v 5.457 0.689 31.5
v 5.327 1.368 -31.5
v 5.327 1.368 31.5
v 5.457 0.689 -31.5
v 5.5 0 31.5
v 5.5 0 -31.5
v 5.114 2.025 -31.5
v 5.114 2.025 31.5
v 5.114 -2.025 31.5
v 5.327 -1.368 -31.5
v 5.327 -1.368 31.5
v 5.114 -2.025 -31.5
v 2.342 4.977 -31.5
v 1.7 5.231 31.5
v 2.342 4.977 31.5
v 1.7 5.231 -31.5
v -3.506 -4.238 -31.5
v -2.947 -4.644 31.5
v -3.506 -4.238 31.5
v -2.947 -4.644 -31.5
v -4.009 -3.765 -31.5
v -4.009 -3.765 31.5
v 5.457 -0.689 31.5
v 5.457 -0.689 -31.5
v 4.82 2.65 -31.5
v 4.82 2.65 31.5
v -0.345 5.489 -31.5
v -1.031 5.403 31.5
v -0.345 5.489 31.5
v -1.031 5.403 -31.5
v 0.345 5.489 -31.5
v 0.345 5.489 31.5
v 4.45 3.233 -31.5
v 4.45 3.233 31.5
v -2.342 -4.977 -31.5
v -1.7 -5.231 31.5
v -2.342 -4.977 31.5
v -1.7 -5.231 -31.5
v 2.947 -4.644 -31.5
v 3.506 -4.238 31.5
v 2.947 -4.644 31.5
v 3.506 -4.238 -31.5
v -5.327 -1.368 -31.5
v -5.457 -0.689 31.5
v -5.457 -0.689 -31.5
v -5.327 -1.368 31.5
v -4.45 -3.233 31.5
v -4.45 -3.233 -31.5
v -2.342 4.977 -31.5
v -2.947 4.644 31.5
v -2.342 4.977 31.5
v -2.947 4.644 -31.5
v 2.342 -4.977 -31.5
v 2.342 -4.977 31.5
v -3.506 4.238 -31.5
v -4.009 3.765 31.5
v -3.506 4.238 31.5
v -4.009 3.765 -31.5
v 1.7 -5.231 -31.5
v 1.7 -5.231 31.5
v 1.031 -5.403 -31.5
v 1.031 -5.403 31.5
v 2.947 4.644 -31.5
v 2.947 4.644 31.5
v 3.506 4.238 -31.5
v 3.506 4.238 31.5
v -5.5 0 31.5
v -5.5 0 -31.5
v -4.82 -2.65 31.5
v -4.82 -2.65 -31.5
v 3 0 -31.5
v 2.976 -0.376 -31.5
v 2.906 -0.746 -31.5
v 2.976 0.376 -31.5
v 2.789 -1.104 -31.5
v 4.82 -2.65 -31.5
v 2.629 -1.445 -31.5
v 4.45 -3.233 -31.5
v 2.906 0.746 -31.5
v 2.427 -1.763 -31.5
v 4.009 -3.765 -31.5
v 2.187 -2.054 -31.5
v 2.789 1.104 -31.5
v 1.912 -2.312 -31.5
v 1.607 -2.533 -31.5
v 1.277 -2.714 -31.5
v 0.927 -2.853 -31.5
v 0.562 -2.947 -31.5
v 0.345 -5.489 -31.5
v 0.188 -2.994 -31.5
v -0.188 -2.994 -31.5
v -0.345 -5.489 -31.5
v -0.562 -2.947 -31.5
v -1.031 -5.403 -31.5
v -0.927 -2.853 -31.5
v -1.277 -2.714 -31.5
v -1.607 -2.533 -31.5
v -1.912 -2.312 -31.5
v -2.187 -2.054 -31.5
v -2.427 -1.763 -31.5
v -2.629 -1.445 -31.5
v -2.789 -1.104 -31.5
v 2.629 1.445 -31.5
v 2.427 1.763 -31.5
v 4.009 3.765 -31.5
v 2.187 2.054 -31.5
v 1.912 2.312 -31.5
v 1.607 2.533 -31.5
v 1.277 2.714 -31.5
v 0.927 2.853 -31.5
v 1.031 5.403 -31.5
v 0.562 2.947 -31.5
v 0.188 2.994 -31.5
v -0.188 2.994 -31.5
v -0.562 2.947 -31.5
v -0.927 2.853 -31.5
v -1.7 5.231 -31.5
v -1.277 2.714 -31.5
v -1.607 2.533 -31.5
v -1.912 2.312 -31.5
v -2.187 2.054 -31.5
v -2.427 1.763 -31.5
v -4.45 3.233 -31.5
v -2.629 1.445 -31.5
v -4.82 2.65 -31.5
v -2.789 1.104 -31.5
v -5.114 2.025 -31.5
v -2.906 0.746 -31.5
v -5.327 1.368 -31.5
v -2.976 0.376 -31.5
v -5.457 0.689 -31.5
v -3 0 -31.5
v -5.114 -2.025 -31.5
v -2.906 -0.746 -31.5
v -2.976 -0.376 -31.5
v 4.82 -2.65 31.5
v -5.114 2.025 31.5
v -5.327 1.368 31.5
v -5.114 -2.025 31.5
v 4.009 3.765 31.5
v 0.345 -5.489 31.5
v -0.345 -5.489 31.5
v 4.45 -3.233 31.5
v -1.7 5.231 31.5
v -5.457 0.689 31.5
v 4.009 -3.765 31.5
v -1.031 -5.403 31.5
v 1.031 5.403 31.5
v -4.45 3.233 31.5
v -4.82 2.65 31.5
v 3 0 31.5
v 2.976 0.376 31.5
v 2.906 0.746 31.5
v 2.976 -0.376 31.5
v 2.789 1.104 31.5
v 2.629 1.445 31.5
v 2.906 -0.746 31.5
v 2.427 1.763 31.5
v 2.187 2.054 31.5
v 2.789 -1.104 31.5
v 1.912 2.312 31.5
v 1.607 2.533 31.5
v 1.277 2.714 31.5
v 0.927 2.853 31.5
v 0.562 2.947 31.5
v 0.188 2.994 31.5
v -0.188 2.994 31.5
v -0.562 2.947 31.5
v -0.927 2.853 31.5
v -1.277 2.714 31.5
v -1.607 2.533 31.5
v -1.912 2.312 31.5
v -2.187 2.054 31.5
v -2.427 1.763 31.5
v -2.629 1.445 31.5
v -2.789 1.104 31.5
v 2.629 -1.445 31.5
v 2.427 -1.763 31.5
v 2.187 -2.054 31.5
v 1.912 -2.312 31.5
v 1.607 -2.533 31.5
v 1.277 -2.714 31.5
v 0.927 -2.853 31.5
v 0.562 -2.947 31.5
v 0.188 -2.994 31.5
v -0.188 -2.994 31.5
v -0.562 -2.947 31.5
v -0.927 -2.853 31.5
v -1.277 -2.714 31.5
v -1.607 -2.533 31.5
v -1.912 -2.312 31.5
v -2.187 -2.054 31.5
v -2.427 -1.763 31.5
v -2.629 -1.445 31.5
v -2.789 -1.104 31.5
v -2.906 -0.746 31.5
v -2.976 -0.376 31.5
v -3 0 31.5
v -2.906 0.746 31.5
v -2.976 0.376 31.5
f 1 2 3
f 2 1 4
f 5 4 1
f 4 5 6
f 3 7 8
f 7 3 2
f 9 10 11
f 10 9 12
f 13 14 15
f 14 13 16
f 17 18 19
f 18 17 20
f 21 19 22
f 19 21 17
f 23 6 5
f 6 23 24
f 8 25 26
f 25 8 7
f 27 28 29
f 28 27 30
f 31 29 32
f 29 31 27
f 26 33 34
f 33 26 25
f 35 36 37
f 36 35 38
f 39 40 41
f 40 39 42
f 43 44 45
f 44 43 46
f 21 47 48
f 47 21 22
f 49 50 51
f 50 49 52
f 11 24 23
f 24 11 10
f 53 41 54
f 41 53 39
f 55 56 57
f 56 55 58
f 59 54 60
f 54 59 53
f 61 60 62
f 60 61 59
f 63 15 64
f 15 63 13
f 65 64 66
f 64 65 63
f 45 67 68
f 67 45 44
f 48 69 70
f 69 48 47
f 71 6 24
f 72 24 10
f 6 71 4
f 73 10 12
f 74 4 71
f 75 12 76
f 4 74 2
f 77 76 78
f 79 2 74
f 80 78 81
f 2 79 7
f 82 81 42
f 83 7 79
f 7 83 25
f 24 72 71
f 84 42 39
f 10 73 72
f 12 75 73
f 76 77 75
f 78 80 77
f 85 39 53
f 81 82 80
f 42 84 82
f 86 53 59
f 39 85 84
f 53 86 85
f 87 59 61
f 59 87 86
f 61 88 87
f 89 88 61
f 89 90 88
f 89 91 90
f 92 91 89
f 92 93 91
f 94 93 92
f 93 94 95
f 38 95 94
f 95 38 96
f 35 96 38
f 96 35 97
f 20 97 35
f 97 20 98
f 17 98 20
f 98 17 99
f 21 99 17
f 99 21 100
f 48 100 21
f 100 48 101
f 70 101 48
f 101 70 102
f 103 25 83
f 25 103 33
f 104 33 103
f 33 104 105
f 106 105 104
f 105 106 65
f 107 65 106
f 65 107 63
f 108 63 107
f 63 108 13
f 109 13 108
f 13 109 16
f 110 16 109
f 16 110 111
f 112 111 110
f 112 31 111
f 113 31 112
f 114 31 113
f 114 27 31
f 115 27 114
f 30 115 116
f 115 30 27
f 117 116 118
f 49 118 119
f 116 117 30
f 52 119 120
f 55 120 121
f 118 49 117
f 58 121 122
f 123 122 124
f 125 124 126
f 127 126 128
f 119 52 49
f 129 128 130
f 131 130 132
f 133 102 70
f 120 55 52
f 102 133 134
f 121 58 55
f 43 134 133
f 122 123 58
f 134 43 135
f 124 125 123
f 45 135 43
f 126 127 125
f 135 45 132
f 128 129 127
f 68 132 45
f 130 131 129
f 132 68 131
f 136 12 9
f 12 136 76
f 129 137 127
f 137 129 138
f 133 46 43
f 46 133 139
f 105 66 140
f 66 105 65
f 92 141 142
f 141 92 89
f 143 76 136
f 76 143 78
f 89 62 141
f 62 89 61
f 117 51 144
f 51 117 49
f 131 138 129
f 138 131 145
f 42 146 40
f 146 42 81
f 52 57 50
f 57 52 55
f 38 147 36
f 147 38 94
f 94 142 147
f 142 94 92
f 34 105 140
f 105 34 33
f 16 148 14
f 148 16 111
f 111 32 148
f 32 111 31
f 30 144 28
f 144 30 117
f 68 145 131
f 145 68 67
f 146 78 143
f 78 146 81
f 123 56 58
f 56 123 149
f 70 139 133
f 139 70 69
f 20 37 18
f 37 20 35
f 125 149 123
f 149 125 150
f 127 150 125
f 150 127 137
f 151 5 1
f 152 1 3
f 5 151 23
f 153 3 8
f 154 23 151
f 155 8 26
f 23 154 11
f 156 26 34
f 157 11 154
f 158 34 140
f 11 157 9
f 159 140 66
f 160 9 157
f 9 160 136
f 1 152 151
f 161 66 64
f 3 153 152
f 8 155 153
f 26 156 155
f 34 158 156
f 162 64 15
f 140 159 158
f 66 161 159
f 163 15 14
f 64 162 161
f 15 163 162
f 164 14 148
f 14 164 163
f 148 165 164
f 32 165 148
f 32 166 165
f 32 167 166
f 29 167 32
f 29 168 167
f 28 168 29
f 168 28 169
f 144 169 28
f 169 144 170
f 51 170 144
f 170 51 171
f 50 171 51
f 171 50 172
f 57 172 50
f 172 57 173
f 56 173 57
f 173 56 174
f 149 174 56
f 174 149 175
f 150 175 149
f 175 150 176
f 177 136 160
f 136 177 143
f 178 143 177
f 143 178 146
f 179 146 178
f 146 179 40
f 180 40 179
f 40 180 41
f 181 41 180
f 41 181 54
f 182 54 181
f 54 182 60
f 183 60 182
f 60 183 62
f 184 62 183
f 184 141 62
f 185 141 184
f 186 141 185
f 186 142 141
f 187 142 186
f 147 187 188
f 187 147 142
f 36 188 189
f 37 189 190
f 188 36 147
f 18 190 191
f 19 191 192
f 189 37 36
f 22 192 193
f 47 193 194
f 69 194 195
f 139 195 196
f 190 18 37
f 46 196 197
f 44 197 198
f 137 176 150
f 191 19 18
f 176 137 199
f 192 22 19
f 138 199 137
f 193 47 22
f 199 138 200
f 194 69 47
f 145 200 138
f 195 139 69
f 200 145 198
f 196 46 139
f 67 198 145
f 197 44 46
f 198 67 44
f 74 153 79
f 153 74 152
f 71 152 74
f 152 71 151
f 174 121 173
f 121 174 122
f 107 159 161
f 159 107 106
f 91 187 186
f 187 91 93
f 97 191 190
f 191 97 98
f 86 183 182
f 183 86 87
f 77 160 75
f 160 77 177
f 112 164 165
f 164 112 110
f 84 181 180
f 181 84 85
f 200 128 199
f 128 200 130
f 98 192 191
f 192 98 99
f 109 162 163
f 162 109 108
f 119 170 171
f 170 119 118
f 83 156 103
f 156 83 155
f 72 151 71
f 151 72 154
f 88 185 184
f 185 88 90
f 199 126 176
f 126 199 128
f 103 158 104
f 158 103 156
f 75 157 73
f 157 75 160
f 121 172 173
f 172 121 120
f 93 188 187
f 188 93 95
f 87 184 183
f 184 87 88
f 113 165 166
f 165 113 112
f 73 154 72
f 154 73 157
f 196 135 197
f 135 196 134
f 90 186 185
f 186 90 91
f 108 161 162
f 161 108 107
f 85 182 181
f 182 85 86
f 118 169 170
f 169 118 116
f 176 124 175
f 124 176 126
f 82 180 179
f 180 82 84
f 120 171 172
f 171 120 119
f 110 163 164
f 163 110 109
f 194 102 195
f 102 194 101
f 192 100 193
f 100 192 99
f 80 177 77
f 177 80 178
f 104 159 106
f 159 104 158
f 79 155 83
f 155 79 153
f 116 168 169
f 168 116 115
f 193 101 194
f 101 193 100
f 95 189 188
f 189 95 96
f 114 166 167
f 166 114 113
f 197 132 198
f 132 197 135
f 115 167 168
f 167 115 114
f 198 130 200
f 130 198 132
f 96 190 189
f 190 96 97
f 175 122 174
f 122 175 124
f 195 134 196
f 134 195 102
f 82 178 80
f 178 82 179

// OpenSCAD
$fn = 50;


difference() {
	union() {
		translate(v = [0, 0, -31.5000000000]) {
			cylinder(h = 63, r = 5.5000000000);
		}
	}
	union() {
		translate(v = [0, 0, -100.0000000000]) {
			cylinder(h = 200, r = 3.0000000000);
		}
	}
}
